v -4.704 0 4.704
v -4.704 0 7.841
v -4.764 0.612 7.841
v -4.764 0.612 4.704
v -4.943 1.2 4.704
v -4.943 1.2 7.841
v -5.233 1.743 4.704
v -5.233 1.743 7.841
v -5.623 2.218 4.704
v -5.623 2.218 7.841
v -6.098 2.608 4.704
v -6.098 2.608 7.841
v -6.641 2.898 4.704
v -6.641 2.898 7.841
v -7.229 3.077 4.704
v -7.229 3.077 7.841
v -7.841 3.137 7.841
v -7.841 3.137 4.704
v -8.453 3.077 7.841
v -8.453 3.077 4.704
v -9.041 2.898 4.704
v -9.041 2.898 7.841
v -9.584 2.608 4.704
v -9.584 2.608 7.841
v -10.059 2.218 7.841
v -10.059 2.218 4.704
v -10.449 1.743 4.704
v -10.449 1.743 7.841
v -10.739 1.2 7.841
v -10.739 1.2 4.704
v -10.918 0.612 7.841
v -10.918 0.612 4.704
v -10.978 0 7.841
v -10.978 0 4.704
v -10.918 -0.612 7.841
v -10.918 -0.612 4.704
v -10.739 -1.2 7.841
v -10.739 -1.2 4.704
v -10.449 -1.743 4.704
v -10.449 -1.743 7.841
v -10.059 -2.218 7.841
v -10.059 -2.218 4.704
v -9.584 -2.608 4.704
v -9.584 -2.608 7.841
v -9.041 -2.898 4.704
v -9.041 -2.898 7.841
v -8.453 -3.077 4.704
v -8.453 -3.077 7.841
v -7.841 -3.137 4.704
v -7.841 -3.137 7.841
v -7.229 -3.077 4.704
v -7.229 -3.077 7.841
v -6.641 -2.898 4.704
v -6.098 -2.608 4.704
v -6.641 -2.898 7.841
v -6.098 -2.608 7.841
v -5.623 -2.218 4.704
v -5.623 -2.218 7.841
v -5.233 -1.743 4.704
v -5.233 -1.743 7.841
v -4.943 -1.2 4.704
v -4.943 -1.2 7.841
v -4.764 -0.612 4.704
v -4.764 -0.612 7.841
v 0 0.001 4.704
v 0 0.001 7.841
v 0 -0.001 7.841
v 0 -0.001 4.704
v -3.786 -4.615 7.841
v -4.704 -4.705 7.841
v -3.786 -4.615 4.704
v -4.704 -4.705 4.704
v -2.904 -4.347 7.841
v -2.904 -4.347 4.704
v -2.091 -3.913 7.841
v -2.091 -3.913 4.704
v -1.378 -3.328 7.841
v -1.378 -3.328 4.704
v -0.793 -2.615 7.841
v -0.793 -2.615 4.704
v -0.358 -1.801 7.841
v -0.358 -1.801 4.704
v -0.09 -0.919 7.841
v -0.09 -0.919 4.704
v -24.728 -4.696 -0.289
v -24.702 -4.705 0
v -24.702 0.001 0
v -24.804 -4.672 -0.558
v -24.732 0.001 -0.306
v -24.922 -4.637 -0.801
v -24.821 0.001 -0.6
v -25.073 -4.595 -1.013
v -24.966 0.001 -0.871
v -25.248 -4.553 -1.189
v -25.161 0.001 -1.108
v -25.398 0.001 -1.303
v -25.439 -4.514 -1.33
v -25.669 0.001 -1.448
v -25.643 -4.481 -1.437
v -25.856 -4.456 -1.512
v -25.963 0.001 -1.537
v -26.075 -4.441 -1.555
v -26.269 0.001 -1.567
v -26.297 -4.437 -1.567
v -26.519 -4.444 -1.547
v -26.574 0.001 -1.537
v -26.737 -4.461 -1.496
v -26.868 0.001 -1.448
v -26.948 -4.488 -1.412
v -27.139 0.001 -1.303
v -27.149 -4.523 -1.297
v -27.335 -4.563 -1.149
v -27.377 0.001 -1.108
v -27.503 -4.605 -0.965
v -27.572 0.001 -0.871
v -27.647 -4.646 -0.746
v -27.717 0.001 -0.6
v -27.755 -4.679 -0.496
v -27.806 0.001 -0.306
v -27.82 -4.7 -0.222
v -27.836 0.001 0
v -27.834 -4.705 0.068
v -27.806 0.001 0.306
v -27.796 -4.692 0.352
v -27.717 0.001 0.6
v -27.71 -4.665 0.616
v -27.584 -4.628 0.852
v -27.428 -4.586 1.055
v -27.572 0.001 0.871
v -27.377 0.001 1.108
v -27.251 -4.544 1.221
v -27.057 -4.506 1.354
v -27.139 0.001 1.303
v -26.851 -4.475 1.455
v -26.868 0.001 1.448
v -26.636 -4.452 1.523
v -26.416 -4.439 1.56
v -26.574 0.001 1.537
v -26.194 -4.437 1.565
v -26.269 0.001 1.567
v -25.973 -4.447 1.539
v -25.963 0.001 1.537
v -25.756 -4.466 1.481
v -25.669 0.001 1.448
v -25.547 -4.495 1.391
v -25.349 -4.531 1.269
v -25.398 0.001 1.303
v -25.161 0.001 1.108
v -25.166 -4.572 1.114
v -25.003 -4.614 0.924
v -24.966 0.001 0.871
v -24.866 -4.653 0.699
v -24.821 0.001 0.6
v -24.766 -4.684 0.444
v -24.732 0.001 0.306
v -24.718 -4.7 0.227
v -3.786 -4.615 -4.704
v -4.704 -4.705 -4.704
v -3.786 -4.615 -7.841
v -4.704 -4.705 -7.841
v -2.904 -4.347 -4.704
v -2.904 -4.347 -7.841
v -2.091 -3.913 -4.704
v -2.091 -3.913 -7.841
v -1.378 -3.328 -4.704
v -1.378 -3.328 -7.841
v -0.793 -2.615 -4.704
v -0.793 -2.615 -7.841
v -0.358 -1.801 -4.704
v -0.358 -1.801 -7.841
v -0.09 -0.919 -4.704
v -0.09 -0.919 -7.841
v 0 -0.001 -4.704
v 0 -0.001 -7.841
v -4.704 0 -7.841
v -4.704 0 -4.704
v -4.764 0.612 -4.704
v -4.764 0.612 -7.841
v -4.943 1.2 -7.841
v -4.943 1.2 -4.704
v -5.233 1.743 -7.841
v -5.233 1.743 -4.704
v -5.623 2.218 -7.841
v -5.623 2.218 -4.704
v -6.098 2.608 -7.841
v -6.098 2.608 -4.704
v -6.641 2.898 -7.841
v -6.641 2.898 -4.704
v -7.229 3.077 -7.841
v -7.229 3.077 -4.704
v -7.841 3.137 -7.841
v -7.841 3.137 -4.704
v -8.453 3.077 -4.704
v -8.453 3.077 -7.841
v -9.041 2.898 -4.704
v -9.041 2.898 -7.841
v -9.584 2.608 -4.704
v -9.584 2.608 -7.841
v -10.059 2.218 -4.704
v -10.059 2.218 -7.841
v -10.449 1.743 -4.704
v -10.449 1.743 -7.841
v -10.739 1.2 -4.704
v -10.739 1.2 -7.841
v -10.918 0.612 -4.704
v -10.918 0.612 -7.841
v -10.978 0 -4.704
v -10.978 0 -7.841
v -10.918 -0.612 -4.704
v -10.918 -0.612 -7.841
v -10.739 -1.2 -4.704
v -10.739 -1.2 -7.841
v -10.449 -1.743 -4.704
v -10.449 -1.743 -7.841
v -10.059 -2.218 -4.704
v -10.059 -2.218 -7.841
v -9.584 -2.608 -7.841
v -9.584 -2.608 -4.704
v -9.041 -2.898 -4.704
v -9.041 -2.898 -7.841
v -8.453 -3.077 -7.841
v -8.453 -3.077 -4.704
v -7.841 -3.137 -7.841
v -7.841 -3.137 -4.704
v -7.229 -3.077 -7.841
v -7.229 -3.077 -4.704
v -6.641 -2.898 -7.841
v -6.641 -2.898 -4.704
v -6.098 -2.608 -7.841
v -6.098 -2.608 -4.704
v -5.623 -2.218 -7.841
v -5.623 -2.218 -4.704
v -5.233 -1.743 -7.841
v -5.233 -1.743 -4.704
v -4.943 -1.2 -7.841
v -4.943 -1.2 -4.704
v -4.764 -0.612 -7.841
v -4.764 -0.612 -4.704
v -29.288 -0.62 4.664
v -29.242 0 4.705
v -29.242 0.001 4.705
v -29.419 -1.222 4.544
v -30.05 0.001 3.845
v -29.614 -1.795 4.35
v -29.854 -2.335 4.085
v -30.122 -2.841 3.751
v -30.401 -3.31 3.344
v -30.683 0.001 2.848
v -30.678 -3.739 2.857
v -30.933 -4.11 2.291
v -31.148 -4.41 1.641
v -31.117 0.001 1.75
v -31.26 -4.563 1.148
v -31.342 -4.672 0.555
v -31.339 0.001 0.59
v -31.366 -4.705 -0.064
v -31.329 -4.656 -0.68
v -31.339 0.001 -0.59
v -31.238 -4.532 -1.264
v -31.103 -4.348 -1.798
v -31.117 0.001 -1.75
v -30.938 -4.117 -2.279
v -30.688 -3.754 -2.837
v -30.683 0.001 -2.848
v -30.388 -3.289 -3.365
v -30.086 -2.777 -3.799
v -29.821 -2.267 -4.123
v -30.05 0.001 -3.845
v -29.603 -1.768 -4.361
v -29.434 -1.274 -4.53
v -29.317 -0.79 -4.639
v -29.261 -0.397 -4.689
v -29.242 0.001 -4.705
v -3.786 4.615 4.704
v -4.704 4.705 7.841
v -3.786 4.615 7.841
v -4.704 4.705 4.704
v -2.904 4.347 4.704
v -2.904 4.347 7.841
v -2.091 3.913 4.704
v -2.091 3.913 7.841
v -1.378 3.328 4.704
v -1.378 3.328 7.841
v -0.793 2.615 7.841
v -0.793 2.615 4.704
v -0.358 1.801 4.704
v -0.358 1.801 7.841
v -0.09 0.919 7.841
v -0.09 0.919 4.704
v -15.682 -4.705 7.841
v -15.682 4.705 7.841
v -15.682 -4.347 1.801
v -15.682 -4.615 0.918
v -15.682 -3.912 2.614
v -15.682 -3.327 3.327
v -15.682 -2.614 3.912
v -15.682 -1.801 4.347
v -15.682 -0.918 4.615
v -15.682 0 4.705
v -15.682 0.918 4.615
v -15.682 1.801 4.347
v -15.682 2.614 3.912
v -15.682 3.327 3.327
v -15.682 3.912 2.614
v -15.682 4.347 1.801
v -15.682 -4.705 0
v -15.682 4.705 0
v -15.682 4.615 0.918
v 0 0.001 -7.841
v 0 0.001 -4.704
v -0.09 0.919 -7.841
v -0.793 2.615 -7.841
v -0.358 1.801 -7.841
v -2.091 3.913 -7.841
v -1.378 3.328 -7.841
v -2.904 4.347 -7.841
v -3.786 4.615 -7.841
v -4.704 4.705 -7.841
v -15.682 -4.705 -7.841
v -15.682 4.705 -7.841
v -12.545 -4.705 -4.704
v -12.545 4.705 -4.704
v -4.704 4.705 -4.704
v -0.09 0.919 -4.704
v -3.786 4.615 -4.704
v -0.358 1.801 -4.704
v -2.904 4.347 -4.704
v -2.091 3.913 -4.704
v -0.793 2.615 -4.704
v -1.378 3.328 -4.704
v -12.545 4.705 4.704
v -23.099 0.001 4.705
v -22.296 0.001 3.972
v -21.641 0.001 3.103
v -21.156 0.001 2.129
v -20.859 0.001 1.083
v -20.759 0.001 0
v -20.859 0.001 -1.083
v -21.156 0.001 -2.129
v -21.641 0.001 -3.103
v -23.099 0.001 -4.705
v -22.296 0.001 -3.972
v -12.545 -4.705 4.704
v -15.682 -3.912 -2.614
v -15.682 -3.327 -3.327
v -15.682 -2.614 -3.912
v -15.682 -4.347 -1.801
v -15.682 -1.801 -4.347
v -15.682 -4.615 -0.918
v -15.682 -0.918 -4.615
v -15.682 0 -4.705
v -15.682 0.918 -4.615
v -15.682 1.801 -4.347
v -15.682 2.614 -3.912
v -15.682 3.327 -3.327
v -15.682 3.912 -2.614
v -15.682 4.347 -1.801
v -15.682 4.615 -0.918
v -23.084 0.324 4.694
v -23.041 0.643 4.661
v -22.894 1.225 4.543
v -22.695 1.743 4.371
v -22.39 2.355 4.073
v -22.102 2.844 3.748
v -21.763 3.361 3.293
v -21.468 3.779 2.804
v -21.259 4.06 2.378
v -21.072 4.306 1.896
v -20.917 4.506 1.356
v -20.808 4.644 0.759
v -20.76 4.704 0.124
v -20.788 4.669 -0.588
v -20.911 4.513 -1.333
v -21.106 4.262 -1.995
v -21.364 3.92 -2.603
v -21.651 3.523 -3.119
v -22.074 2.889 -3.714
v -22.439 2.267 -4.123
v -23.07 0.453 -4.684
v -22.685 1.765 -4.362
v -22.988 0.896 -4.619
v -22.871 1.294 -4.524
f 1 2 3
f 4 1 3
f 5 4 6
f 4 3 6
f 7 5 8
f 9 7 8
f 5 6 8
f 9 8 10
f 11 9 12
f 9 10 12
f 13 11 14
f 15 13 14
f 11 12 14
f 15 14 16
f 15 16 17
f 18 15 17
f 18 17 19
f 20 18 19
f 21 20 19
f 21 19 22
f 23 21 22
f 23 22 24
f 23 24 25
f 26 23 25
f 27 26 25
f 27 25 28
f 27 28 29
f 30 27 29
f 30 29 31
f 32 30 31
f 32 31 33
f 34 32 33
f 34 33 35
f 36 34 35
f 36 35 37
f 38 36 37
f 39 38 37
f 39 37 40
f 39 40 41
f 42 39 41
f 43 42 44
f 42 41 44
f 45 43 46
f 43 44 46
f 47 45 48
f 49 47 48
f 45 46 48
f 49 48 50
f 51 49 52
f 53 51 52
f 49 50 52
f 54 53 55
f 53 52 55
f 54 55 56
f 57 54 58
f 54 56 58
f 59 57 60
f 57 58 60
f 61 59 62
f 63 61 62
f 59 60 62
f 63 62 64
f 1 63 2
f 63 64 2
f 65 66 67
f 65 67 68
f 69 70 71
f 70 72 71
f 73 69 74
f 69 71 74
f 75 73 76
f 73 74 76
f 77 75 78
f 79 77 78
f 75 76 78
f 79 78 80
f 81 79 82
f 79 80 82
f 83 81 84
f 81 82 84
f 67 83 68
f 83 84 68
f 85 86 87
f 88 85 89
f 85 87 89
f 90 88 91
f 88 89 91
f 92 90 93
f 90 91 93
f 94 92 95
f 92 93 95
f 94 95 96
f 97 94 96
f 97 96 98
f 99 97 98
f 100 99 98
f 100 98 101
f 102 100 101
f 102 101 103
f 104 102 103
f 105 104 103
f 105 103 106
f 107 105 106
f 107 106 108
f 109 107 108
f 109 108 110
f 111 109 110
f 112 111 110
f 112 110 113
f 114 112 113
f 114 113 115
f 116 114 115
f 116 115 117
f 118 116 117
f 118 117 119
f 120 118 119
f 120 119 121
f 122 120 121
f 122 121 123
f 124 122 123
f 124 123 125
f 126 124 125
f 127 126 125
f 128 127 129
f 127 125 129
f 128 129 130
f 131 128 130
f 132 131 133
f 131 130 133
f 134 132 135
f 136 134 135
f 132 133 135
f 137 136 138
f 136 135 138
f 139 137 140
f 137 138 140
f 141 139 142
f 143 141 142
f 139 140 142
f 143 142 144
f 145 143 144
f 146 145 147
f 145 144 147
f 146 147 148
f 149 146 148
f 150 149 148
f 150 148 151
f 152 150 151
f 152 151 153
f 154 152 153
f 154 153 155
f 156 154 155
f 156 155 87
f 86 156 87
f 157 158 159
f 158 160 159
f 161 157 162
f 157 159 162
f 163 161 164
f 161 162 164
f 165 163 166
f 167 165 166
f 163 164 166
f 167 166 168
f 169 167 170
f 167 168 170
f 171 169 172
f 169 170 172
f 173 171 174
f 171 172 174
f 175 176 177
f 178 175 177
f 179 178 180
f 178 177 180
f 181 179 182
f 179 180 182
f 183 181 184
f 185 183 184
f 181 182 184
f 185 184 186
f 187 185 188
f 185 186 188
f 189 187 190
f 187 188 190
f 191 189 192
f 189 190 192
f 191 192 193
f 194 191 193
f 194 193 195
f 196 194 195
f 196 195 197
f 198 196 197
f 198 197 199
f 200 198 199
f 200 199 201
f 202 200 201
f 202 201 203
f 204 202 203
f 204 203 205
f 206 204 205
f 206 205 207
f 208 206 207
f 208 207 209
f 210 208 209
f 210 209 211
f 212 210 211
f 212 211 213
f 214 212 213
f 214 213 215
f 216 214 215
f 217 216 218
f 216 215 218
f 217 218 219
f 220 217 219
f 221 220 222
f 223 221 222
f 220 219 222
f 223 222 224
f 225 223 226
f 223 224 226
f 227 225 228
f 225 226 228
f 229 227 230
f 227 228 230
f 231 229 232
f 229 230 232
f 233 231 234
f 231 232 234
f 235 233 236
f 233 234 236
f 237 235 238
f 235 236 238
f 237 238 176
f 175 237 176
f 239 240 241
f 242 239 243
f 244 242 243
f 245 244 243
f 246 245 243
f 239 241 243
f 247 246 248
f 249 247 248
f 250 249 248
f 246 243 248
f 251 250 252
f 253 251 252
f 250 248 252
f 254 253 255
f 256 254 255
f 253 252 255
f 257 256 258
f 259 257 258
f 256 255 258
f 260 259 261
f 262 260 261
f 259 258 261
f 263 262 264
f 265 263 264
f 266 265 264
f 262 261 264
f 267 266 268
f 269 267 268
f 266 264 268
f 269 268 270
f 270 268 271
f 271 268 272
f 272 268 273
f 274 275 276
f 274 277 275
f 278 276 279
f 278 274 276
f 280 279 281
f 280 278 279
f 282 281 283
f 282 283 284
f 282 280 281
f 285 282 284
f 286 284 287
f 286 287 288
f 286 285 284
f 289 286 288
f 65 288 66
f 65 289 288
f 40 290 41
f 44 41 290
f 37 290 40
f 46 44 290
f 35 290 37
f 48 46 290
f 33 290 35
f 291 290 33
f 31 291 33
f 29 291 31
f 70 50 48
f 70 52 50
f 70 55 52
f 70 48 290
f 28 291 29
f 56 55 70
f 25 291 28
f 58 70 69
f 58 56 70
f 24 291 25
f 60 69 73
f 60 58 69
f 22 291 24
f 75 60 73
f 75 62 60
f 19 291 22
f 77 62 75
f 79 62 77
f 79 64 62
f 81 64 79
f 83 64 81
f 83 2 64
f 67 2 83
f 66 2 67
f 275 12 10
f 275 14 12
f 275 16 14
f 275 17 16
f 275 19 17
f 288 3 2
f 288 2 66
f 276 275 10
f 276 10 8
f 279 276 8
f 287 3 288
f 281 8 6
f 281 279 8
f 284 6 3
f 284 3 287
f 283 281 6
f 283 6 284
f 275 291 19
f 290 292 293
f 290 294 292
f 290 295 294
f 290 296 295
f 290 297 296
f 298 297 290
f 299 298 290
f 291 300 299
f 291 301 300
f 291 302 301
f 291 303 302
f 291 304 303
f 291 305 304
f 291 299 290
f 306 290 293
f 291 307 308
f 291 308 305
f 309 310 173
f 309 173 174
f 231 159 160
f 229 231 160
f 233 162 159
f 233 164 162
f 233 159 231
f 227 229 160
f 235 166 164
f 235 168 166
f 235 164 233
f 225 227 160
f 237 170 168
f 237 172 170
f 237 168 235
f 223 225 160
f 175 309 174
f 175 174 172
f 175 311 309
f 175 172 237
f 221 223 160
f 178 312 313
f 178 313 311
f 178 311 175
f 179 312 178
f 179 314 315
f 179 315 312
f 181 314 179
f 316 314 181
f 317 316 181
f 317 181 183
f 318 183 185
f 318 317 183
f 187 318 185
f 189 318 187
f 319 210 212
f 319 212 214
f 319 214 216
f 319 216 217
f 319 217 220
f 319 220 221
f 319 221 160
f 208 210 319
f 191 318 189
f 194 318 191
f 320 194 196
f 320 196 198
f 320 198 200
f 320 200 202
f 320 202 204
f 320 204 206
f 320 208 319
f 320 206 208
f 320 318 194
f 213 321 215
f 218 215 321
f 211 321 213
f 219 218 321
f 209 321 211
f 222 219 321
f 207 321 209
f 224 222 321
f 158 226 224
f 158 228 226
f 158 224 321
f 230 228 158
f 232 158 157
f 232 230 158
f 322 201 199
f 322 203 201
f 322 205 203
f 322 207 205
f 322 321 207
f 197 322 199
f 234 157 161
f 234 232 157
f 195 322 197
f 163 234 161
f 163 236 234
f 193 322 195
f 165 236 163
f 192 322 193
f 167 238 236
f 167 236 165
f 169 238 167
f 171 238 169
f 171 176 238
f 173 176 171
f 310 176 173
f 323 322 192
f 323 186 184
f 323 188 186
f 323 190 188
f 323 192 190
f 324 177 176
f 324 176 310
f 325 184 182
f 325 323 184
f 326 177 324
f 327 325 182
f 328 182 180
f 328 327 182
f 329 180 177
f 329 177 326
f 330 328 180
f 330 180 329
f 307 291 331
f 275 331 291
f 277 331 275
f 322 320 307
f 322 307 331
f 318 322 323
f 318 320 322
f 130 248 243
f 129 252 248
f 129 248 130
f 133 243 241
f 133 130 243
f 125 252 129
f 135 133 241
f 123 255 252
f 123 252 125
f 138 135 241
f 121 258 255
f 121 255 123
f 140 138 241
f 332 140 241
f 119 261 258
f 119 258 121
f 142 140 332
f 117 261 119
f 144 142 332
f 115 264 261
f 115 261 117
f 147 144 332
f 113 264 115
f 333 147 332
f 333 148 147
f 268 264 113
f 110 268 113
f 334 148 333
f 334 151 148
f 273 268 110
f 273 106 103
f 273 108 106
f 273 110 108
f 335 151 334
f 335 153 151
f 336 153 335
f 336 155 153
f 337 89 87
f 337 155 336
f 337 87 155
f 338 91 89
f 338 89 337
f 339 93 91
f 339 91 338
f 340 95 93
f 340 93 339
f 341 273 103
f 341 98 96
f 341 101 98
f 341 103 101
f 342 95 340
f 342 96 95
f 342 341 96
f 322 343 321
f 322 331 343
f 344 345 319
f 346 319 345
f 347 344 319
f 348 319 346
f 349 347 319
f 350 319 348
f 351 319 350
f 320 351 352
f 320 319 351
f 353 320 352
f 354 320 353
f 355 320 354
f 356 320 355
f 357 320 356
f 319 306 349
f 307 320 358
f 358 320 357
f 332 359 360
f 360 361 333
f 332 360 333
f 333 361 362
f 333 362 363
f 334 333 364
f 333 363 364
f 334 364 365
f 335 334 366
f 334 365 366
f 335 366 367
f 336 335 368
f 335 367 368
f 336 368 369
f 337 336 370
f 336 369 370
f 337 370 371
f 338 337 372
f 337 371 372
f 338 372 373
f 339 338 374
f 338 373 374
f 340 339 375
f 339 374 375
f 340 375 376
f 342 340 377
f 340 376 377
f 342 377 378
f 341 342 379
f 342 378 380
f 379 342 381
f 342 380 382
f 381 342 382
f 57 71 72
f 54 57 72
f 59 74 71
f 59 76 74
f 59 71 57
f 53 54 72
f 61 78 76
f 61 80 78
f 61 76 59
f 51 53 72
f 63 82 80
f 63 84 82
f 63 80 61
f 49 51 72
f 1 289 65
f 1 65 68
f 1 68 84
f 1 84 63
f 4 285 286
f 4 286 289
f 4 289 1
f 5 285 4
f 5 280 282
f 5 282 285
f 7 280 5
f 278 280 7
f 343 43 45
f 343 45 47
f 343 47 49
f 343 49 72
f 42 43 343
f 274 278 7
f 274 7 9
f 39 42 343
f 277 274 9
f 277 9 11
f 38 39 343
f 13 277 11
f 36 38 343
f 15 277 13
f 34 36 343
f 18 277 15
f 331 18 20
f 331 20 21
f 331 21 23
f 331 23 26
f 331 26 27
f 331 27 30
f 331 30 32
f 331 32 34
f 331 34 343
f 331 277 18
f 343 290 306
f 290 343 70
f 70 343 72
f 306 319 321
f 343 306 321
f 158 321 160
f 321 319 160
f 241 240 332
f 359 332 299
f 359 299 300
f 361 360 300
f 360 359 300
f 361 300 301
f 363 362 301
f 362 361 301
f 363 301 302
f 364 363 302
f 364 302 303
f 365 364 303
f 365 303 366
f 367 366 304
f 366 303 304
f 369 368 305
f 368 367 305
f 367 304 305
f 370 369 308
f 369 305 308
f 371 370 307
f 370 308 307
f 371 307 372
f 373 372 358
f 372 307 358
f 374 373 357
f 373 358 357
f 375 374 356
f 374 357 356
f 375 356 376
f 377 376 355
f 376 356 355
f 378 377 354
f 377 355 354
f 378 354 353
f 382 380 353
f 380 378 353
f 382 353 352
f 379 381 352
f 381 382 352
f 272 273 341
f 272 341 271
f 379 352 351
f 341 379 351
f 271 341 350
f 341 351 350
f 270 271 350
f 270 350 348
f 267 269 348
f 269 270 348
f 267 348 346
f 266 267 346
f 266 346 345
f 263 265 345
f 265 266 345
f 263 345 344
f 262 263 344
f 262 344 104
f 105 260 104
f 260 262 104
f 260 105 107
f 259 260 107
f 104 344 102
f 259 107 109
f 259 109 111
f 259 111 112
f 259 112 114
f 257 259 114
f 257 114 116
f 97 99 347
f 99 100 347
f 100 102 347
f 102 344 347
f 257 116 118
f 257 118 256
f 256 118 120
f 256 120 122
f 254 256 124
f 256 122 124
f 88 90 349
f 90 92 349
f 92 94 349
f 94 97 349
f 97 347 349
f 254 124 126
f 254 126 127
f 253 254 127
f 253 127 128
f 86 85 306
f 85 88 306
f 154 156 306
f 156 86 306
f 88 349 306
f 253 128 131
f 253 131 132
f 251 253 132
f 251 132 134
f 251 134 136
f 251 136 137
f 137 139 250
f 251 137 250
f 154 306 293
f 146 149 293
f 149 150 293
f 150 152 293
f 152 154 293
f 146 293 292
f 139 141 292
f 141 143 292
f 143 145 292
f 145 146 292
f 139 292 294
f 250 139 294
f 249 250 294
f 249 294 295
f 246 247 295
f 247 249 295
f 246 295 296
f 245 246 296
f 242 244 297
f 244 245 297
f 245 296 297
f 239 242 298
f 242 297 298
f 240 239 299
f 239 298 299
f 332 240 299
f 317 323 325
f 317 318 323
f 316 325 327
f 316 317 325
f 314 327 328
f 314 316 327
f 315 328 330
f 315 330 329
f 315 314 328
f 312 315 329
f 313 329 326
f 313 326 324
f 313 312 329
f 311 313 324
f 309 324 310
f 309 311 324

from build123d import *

# Parameters (mm, degrees)
BOSS_EXTRUDE1_DEPTH      = 4.70535
BOSS_EXTRUDE1_DEPTH_BACK = 4.70535
SKETCH2_R                = 4.70535
BOSS_EXTRUDE2_DEPTH      = 17.25168
CUT_EXTRUDE3_DEPTH       = 10.4107
SKETCH5_R                = 5.900934737
CUT_EXTRUDE4_DEPTH       = 4.70408
SKETCH6_R                = 1.56718
CUT_EXTRUDE5_DEPTH       = 5.706620123
FILLET1_R                = 4.70408
SKETCH7_R                = 3.1369
CUT_EXTRUDE6_DEPTH       = 16.68196


with BuildPart() as part:
    # Sketch1 → Boss-Extrude1 (new body, two sides)
    with BuildSketch(Plane(origin=(0, 0, 0), x_dir=(1, 0, 0), z_dir=(0, 1, 0))) as boss_extrude1_sk:
        Polygon((-12.54506, 4.70408), (0, 4.70408), (0, 7.84098), (-15.68196, 7.84098), (-15.68196, -7.84098), (0, -7.84098), (0, -4.70408), (-12.54506, -4.70408), align=None)
    extrude(amount=BOSS_EXTRUDE1_DEPTH)
    extrude(boss_extrude1_sk.sketch, amount=-BOSS_EXTRUDE1_DEPTH_BACK)

    # Sketch2 → Boss-Extrude2 (add)
    with BuildSketch(Plane.ZY.offset(15.68196)):
        Circle(SKETCH2_R)
    extrude(amount=BOSS_EXTRUDE2_DEPTH)

    # Sketch3 → Cut-Extrude3 (cut, through all)
    with BuildSketch(Plane(origin=(0, 4.70535, 0), x_dir=(1, 0, 0), z_dir=(0, 1, 0))):
        with BuildLine():
            Line((-25.09266, 6.2738), (-33.67290655, 6.2738))
            Line((-33.67290655, 6.2738), (-33.67290655, -6.2738))
            Line((-33.67290655, -6.2738), (-25.09266, -6.2738))
            ThreePointArc((-25.09266, -6.2738), (-31.36646, 0), (-25.09266, 6.2738))
        make_face()
    extrude(amount=-CUT_EXTRUDE3_DEPTH, mode=Mode.SUBTRACT)

    # Sketch5 → Cut-Extrude4 (cut)
    with BuildSketch(Plane(origin=(0, 4.70535, 0), x_dir=(1, 0, 0), z_dir=(0, 1, 0))):
        with Locations((-26.65984, 0)):
            Circle(SKETCH5_R)
    extrude(amount=-CUT_EXTRUDE4_DEPTH, mode=Mode.SUBTRACT)

    # Sketch6 → Cut-Extrude5 (cut, through all)
    with BuildSketch(Plane(origin=(0, 0.00127, 0), x_dir=(1, 0, 0), z_dir=(0, 1, 0))):
        with Locations((-26.26868, 0)):
            Circle(SKETCH6_R)
    extrude(amount=-CUT_EXTRUDE5_DEPTH, mode=Mode.SUBTRACT)

    # Fillet1
    fillet1_edges = [part.edges().sort_by_distance(p)[0] for p in [
        (0, -4.70535, -6.27253),
        (0, -4.70535, 6.27253),
        (0, 4.70535, -6.27253),
        (0, 4.70535, 6.27253),
    ]]
    fillet(fillet1_edges, radius=FILLET1_R)

    # Sketch7 → Cut-Extrude6 (cut, through all)
    with BuildSketch(Plane.XY.offset(7.84098)):
        with Locations((-7.84098, 0)):
            Circle(SKETCH7_R)
    extrude(amount=-CUT_EXTRUDE6_DEPTH, mode=Mode.SUBTRACT)


solid = part.part
